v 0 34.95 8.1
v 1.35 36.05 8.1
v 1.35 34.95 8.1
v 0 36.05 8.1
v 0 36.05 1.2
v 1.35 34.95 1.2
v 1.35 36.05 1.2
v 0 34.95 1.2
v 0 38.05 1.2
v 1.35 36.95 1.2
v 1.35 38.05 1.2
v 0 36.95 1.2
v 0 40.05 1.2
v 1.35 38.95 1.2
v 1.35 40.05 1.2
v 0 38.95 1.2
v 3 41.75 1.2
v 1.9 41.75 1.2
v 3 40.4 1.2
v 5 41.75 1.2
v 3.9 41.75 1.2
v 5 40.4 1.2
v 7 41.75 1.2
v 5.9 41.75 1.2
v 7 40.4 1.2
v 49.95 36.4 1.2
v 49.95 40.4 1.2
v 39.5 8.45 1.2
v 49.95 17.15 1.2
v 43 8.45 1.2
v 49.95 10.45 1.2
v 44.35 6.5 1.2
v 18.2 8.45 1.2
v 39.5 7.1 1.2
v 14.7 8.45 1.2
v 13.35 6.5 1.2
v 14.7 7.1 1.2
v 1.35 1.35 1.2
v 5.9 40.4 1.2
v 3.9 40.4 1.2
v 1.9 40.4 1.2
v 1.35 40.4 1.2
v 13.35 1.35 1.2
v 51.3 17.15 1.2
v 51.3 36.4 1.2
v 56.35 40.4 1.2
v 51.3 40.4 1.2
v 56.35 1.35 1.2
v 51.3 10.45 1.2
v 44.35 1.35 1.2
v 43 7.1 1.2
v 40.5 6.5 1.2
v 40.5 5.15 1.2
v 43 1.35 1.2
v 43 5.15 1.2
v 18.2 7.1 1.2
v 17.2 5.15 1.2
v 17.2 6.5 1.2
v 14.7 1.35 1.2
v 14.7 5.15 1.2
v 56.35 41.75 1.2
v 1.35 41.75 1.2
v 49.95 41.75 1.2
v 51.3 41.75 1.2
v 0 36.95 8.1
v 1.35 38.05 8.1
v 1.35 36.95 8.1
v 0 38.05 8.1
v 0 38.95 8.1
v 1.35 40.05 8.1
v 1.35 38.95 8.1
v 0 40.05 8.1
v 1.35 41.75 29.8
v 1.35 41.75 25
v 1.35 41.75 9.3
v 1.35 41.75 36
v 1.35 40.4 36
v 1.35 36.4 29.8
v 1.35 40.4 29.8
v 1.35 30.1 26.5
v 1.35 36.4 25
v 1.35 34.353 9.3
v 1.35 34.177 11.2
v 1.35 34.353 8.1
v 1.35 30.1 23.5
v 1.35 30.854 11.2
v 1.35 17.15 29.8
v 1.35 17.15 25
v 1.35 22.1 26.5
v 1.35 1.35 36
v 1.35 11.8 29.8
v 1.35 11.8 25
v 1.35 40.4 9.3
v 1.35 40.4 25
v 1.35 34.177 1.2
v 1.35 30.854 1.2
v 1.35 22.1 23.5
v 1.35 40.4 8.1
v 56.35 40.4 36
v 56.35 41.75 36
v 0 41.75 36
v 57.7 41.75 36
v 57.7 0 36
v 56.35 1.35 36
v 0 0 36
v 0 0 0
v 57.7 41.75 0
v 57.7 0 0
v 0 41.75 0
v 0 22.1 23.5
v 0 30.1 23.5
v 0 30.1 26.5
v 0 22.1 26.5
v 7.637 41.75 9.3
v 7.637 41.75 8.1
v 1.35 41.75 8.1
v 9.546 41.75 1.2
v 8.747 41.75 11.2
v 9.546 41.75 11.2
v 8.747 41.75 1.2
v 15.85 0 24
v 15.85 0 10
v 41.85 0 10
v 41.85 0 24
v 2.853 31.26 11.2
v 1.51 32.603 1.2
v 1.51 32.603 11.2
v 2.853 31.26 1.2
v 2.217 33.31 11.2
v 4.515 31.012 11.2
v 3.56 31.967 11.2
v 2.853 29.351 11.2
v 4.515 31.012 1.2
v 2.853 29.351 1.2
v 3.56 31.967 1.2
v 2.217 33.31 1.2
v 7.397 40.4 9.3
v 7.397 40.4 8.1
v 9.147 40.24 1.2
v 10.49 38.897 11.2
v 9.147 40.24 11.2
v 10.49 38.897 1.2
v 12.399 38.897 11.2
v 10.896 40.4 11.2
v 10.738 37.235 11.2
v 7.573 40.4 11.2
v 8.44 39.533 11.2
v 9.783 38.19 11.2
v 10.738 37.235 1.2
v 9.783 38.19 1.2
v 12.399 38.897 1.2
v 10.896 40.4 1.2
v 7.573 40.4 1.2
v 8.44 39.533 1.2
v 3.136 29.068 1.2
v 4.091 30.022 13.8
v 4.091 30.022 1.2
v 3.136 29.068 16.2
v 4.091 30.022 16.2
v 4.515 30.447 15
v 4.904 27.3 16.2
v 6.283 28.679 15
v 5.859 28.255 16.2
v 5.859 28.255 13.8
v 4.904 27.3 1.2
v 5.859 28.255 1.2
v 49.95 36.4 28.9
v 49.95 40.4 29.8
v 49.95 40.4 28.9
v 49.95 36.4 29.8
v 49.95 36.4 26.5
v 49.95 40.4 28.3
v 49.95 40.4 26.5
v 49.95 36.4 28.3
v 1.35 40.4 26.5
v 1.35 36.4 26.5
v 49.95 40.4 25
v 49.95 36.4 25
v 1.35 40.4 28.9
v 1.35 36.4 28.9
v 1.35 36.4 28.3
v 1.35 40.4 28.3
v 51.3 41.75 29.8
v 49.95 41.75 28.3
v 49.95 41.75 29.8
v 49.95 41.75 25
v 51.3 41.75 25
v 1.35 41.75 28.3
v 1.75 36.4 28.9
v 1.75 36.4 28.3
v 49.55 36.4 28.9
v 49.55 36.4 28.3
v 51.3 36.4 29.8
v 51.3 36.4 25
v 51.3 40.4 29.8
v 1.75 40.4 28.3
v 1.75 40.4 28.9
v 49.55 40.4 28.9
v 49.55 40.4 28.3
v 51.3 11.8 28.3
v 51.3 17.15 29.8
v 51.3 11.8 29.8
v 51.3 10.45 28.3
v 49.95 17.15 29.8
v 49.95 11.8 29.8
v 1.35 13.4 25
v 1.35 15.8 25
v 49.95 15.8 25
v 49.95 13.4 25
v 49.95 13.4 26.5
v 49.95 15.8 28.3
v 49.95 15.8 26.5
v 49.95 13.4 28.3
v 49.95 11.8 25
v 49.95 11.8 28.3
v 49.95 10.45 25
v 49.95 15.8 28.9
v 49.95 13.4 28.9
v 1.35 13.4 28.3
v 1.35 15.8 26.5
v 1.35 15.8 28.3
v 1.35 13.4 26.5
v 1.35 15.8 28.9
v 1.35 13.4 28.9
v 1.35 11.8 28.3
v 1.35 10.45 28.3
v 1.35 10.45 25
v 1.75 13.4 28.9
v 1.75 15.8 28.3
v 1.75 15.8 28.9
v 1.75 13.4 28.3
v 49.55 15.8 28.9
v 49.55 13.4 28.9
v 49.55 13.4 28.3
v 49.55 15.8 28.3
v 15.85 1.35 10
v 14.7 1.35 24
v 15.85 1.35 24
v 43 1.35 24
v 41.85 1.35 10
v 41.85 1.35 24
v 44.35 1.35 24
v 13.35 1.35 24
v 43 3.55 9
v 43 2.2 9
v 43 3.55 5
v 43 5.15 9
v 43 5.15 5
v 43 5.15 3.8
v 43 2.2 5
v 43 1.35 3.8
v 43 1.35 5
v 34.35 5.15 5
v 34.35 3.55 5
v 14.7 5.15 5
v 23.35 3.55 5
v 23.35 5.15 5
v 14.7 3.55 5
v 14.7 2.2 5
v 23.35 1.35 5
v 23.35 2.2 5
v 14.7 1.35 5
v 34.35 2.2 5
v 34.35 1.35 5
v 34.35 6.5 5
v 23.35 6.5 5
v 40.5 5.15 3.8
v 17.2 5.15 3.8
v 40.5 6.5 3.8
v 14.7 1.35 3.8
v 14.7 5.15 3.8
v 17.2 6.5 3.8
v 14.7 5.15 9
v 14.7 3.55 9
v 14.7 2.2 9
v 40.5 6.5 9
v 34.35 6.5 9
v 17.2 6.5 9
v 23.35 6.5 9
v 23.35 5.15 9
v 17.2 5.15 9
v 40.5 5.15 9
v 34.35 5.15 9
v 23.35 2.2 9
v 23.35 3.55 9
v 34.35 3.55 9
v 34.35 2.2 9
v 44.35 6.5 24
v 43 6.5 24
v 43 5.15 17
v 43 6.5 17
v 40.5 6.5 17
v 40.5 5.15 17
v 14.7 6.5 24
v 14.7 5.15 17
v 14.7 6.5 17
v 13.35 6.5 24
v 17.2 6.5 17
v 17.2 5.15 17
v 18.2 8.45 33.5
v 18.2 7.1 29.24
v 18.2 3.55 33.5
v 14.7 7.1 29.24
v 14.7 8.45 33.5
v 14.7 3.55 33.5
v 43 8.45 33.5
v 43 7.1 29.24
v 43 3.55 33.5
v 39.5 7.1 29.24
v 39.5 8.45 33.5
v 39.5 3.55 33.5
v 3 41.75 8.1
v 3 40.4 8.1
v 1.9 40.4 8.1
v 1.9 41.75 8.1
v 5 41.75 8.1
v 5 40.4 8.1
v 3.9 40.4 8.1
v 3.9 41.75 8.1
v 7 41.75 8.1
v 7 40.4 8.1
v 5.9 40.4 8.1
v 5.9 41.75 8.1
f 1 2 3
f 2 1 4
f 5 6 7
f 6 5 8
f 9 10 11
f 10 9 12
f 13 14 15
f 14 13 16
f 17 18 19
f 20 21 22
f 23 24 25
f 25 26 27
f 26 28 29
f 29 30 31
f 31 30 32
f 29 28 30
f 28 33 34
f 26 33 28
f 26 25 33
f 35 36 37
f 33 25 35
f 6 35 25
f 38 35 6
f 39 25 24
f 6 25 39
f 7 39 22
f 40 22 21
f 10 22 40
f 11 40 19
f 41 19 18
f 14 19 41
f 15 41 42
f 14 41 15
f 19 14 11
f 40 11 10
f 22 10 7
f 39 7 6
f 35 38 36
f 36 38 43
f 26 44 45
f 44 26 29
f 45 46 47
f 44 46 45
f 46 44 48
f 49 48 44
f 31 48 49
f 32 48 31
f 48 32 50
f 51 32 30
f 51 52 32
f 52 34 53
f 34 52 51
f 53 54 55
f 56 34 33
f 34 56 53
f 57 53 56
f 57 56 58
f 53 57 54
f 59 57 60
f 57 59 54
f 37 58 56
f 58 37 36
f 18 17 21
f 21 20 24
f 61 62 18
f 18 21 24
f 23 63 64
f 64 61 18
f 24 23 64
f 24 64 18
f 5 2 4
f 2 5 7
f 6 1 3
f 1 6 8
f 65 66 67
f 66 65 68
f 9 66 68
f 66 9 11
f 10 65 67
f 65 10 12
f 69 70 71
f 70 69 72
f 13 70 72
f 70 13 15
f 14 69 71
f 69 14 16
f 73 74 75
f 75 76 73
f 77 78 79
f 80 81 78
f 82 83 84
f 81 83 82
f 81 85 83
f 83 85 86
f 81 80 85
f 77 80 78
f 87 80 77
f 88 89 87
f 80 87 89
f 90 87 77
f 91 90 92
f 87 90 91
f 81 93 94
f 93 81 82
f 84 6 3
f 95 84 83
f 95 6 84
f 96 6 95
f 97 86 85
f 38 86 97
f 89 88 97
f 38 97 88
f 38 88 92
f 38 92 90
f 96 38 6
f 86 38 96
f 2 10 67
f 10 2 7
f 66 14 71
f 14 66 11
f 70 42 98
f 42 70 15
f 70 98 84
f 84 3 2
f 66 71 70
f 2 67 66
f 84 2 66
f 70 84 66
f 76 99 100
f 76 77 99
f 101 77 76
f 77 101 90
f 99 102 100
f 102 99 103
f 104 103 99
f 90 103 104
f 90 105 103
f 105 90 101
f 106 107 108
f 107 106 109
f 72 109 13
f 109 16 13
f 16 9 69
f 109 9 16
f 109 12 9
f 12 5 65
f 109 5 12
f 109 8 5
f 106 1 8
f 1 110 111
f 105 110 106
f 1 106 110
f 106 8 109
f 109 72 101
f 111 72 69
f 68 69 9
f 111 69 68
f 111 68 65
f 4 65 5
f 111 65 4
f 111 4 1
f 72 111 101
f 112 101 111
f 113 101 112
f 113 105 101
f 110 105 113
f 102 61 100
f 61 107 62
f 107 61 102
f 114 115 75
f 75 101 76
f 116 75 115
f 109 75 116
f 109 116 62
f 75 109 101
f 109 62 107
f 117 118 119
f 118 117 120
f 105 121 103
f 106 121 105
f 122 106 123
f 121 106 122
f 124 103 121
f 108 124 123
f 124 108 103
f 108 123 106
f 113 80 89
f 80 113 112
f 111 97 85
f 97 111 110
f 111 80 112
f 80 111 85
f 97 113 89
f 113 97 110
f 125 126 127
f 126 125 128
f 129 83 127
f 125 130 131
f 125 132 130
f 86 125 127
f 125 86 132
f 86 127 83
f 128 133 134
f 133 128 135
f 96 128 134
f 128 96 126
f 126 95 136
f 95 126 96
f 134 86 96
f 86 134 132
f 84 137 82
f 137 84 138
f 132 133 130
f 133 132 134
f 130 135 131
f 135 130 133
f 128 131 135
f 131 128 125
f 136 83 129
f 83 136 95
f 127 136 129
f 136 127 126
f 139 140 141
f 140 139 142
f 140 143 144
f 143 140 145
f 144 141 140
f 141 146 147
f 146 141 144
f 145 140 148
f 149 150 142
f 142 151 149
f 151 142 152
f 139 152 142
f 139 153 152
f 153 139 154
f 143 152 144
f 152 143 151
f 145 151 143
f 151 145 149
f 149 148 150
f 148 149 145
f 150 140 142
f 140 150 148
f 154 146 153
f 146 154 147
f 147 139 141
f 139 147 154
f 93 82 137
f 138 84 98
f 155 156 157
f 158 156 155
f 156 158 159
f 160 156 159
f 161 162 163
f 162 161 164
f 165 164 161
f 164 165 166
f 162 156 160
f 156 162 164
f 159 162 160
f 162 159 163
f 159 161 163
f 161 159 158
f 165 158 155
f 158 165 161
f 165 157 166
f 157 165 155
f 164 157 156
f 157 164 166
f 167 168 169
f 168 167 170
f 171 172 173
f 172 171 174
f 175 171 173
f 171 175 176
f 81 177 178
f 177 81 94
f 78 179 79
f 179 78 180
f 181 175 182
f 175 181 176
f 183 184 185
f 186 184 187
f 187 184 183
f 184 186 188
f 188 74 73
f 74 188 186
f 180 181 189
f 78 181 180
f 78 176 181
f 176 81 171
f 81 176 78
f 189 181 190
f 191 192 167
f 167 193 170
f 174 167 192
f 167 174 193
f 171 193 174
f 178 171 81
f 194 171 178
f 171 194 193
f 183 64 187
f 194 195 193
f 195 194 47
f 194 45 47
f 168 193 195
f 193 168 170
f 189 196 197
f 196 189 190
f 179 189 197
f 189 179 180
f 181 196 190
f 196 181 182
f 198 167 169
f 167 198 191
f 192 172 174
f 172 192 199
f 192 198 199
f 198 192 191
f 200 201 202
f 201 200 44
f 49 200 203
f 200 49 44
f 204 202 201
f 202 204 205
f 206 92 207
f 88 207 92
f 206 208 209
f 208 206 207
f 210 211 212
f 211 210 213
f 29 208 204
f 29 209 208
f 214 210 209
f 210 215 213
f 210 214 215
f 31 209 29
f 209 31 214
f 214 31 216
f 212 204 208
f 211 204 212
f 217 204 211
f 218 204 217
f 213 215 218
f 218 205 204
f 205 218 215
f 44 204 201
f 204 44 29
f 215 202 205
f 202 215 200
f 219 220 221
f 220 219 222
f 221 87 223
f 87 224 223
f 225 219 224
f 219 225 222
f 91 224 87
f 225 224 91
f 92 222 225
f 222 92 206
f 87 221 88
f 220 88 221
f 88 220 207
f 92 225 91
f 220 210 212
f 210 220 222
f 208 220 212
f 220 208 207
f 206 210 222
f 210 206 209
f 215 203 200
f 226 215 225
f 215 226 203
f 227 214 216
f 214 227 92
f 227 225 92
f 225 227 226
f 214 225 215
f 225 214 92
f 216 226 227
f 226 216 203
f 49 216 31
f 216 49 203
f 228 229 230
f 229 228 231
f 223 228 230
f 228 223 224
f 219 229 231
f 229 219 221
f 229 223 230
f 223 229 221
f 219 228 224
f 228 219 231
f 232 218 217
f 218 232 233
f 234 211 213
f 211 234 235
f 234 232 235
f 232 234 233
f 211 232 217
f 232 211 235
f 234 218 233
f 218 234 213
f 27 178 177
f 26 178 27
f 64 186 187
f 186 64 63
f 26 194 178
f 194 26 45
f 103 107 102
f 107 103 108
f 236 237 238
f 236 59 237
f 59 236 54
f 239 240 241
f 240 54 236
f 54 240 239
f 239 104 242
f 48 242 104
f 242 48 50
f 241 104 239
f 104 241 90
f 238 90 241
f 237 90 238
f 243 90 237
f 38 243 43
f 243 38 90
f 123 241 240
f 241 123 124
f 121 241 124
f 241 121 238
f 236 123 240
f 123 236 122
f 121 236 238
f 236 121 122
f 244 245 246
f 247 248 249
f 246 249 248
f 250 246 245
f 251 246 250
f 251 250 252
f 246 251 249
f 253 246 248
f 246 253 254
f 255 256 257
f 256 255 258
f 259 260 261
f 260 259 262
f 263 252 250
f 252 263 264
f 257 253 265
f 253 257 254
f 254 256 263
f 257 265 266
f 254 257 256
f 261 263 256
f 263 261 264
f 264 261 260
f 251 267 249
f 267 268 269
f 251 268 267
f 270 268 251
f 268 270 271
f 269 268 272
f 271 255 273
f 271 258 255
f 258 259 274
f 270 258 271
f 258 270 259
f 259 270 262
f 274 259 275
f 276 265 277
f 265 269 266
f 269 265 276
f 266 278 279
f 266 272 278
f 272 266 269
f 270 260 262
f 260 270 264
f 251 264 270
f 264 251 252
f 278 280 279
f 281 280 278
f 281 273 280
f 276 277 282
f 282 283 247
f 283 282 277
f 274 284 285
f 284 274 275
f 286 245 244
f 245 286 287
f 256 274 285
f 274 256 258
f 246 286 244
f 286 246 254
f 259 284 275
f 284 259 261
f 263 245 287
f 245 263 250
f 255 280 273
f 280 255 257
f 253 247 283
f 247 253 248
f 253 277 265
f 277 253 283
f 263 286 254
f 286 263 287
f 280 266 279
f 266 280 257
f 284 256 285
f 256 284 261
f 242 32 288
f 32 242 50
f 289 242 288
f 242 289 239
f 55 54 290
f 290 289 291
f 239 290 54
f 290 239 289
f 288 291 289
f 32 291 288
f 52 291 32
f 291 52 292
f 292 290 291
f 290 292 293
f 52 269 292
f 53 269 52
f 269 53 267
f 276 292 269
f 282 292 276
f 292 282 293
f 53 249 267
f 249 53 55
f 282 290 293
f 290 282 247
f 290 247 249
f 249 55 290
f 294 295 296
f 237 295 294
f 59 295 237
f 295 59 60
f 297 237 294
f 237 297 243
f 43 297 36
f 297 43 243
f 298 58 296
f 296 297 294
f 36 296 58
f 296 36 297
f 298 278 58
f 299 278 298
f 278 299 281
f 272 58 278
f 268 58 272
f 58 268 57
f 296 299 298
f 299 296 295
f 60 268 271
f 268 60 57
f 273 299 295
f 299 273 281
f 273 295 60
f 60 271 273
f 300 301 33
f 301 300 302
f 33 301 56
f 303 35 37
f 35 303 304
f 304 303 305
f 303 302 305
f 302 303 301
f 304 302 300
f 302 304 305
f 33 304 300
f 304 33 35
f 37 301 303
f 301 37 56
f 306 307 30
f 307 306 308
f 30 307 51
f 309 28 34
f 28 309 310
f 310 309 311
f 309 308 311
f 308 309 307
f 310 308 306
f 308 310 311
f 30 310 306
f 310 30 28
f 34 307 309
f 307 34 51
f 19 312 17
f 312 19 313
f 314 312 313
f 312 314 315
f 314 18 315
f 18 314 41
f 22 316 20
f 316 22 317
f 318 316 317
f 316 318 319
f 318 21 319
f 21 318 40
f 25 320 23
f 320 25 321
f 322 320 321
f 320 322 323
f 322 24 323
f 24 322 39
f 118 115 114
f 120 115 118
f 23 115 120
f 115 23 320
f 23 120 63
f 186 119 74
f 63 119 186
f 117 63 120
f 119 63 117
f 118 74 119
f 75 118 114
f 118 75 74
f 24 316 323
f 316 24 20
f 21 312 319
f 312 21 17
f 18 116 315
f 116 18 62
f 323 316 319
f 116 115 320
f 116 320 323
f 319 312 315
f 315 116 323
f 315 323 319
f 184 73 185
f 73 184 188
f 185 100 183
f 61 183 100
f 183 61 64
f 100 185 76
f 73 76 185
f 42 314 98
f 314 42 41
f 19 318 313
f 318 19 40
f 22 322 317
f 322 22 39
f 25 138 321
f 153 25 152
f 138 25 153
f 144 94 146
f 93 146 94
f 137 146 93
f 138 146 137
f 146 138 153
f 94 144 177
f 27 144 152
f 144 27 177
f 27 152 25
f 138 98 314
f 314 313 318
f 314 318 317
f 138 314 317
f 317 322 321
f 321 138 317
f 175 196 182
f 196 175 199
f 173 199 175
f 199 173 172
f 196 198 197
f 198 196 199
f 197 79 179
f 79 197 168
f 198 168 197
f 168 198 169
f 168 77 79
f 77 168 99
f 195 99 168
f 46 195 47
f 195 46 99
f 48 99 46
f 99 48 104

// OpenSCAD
wallThickness = 1.35;
verticalThickness = 1.2;

tolerance = 0.1;

sensorWidth = 10.8;
sensorLength = 13.8;
sensorArmLength = 10;
sensorThickness = 1.9;
sensorCushion = 10;
sensorGripSize = 1;

sensorLockWidth = 2.5;
sensorLockLead = 1.2;
sensorLockGrip = 0.6;
sensorLockSpacing = 0.4;

apertureWidth = 1.1;
apertureSpacing = 2;
apertureCount = 3;

espBoardTotalLength = 55;
espBoardPCBLength = 48.4 + 0.2;
espBoardWidth = 28.2 + 0.4;
espBoardThickness = 1.5 + 0.3;
espAntennaSideClearance = 4;
espPinHeaderWidth = 1.6;

espMountMainGrip = 4;
espMountGripThickness = 1.5;
espMountCounterSupportWidth = espAntennaSideClearance - espPinHeaderWidth;
espMountCounterLockGrip = 0.4;
espMountCounterLockThickness = 0.6;
espMountLift = verticalThickness + sensorLength + 10;

displayWidth = 26;
displayHeight = 14;
displayBoardWidth = 27.5 + 0.8;
displayBoardHeight = 28;
displayBoardThickness = 1.2 + 0.4;
displayTotalThickness = 3.8;

displayTopOffset = 5;
displayGrip = displayTopOffset * 0.8;
displaySideGrip = 2.5;

displayTopMargin = 10;
displayBottomMargin = 12;

displayLockWidth = 3.5;
displayLockSpacing = 0.6;
displayLockGrip = wallThickness + displayLockSpacing + displayBoardThickness;
displayLockLead = 1.2 * displayLockGrip;
displayLockTopOffset = 0.5;

usbWidth = 8;
usbHeight = 3;

pinHeaderWidth = 10 + 1;

espFrontMargin = 3 * wallThickness + displayTotalThickness + displayLockSpacing + 2;

caseHeight = displayHeight + displayTopMargin + displayBottomMargin;
caseWidth = espBoardTotalLength + 2 * wallThickness;
caseDepth = espBoardWidth + espFrontMargin + 2 * wallThickness;

apertureTotalWidth = apertureCount * apertureSpacing;
espMountYOffset = caseDepth - espBoardWidth - wallThickness;

module mainCase() {
    // ceiling
    cube([caseWidth, caseDepth, verticalThickness]);
    
    // right
    difference() {
        cube([wallThickness, caseDepth, caseHeight]);
        
        translate([0, caseDepth - wallThickness - apertureTotalWidth + apertureWidth / 2, 0])
        for(y = [0:apertureSpacing:apertureTotalWidth - 0.001]) {
            translate([-wallThickness / 2, y, verticalThickness])
            cube([wallThickness * 2, apertureWidth, sensorLength / 2]);
        }
        
        translate([0, espMountYOffset + (espBoardWidth - usbWidth) / 2, espMountLift + espMountGripThickness - usbHeight])
        cube([wallThickness, usbWidth, usbHeight]);
    }
    
    sensorMount();
    
    translate([wallThickness, espMountYOffset, 0])
    espMount();
    
    // left
    translate([caseWidth - wallThickness, 0, 0])
    cube([wallThickness, caseDepth, caseHeight]);
    
    // front
    frontWall();
    
    // back
    translate([0, caseDepth - wallThickness, 0])
    difference() {
        cube([caseWidth, wallThickness, caseHeight]);
        
        translate([wallThickness + apertureWidth / 2, 0, 0])
        for(x = [0:apertureSpacing:apertureTotalWidth - 0.001]) {
            translate([x, -wallThickness / 2, verticalThickness])
            cube([apertureWidth, wallThickness * 2, sensorLength / 2]);
        }
    }
}

module sensorMount() {
    intersection() {
        cube([caseWidth, caseDepth, caseHeight]);
    
        // TODO: I should've been able to properly calculate
        // this based on sensor dimensions
        color("red")
        translate([6, caseDepth - 6, verticalThickness])
        rotate([0, 0, 45])
        translate([-wallThickness - sensorWidth / 2, -wallThickness - sensorThickness / 2, 0]) {
            translate([wallThickness, 2 * wallThickness + sensorThickness, sensorLength / 2])
            cube([sensorWidth, sensorCushion, verticalThickness]);
            
            sensorMountArm();
            
            translate([2 * wallThickness + sensorWidth, 0, 0])
            scale([-1, 1, 1])
            sensorMountArm();
            
            sensorMountLock();
        }
        
    }
}

module sensorMountArm() {
    cube([wallThickness, 2 * wallThickness + sensorThickness, sensorArmLength]);
    
    cube([wallThickness + sensorGripSize, wallThickness, sensorArmLength]);
    
    translate([0, sensorThickness + wallThickness, 0])
    cube([wallThickness + sensorGripSize, wallThickness, sensorArmLength]);
}

module sensorMountLock() {
    translate([0, -sensorLockSpacing, 0])
    rotate([90, 0, 0])
    linear_extrude(sensorLockWidth)
    polygon([
      [0, sensorLength + sensorLockLead],
      [0, 0],
      [wallThickness, 0],
      [wallThickness, sensorLength - sensorLockLead],
      [wallThickness + sensorLockGrip, sensorLength],
      [wallThickness, sensorLength + sensorLockLead]
    ]);
}

module frontWall() {
    difference() {
        cube([caseWidth, wallThickness, caseHeight]);
        
        translate([(caseWidth - displayWidth) / 2, -wallThickness / 2, displayTopMargin])
        cube([displayWidth, wallThickness * 2, displayHeight]);
    }
    
    translate([(caseWidth - displayBoardWidth) / 2, wallThickness, displayTopMargin - verticalThickness - displayTopOffset])    
    difference() {
        union() {
            cube([displayBoardWidth, displayTotalThickness + wallThickness, verticalThickness]);
            
            translate([0, displayTotalThickness - displayBoardThickness - wallThickness, verticalThickness])
            cube([displayBoardWidth, wallThickness, displayGrip]);
            
            translate([0, displayTotalThickness, verticalThickness])
            cube([displayBoardWidth, wallThickness, displayGrip]);
        }
        
        translate([(displayBoardWidth - pinHeaderWidth) / 2, 0, verticalThickness])
        cube([pinHeaderWidth, displayTotalThickness + wallThickness, displayGrip]);
    }
    
    translate([(caseWidth + displayBoardWidth) / 2, wallThickness, 0])
    cube([wallThickness, displayTotalThickness + wallThickness, displayHeight + displayTopMargin]);
    
    translate([(caseWidth + displayBoardWidth) / 2 - displaySideGrip, wallThickness + displayTotalThickness, 0])
    cube([displaySideGrip, wallThickness, displayHeight / 2 + displayTopMargin]);
    
    translate([(caseWidth - displayBoardWidth) / 2 - wallThickness, wallThickness, 0])
    cube([wallThickness, displayTotalThickness + wallThickness, displayHeight + displayTopMargin]);
    
    translate([(caseWidth - displayBoardWidth) / 2, wallThickness + displayTotalThickness, 0])
    cube([displaySideGrip, wallThickness, displayHeight / 2 + displayTopMargin]);
    
    translate([(caseWidth - displayBoardWidth) / 2, 0, 0])
    displayLock();
    
    translate([(caseWidth + displayBoardWidth) / 2 - displayLockWidth, 0, 0])
    displayLock();
}

module displayLock() {
    lockHeight = displayTopMargin - displayTopOffset + displayBoardHeight + displayLockTopOffset;
    
    translate([displayLockWidth, 3 * wallThickness + displayTotalThickness + displayLockSpacing, 0])
    rotate([90, 0, -90])
    linear_extrude(displayLockWidth)
    polygon([
      [0, lockHeight],
      [0, 0],
      [wallThickness, 0],
      [wallThickness, lockHeight - displayLockLead],
      [wallThickness + displayLockGrip, lockHeight]
    ]);
}

module espMount() {
    // main grip
    translate([0, espBoardWidth - espMountMainGrip, espMountLift]) {
        // lower
        cube([espBoardPCBLength, wallThickness + espMountMainGrip, espMountGripThickness]);
        
        // connector between upper and lower
        translate([0, espMountMainGrip, espMountGripThickness])
        cube([espBoardPCBLength, wallThickness, espBoardThickness]);
        
        // right-hand side limiter
        translate([espBoardPCBLength, 0, 0])
        cube([wallThickness, espAntennaSideClearance + wallThickness, 2 * espMountGripThickness + espBoardThickness]);
        
        // left-hand side limiter
        translate([-wallThickness, 0, 0])
        cube([wallThickness, espAntennaSideClearance + wallThickness, 2 * espMountGripThickness + espBoardThickness]);
        
        // left lock
        translate([0, 0, espMountGripThickness + espBoardThickness])
        cube([espMountCounterLockGrip, espMountMainGrip, espMountCounterLockThickness]);
        
        // right lock
        translate([espBoardPCBLength - espMountCounterLockGrip, 0, espMountGripThickness + espBoardThickness])
        cube([espMountCounterLockGrip, espMountMainGrip, espMountCounterLockThickness]);
    }
    
    // counter grip
    translate([0, 0, espMountLift]) {
        // right-hand side limiter
        translate([espBoardPCBLength, 0, 0])
        cube([wallThickness, espAntennaSideClearance + wallThickness, 2 * espMountGripThickness + espBoardThickness]);
            
        // left-hand side limiter
        translate([-wallThickness, 0, 0])
        cube([wallThickness, espAntennaSideClearance + wallThickness, 2 * espMountGripThickness + espBoardThickness]);
        
        // counter support
        translate([0, espPinHeaderWidth, 0])
        cube([espBoardPCBLength, espMountCounterSupportWidth, espMountGripThickness]);
        
        // counter side support
        translate([0, -wallThickness, 0])
        cube([espBoardPCBLength, wallThickness, espMountGripThickness + espBoardThickness]);
        
        // left lock
        translate([0, espPinHeaderWidth, espMountGripThickness + espBoardThickness])
        cube([espMountCounterLockGrip, espMountCounterSupportWidth, espMountCounterLockThickness]);
        
        // right lock
        translate([espBoardPCBLength - espMountCounterLockGrip, espPinHeaderWidth, espMountGripThickness + espBoardThickness])
        cube([espMountCounterLockGrip, espMountCounterSupportWidth, espMountCounterLockThickness]);
    }
    
    // main stand-off
    translate([espBoardPCBLength, espBoardWidth - espMountMainGrip, 0])
    cube([wallThickness, wallThickness + espMountMainGrip, espMountLift]);
    
    // counter stand-off
    translate([espBoardPCBLength, -wallThickness, 0])
    cube([wallThickness, espAntennaSideClearance + 2 * wallThickness, espMountLift + espBoardThickness + espMountGripThickness]);
}

module bottomCap() {
    cube([caseWidth - 2 * (wallThickness + tolerance), caseDepth - 2 * (wallThickness + tolerance), verticalThickness]);
}

module testAssembly() {
    intersection() {
        union() {
            translate([caseWidth, 0, caseHeight])
            rotate([0, 180, 0])
            mainCase();
            
            translate([wallThickness + tolerance, wallThickness + tolerance, 0])
            bottomCap();
        }
        
        cube([caseWidth / 2, caseDepth, caseHeight]);
    }
}

mainCase();
